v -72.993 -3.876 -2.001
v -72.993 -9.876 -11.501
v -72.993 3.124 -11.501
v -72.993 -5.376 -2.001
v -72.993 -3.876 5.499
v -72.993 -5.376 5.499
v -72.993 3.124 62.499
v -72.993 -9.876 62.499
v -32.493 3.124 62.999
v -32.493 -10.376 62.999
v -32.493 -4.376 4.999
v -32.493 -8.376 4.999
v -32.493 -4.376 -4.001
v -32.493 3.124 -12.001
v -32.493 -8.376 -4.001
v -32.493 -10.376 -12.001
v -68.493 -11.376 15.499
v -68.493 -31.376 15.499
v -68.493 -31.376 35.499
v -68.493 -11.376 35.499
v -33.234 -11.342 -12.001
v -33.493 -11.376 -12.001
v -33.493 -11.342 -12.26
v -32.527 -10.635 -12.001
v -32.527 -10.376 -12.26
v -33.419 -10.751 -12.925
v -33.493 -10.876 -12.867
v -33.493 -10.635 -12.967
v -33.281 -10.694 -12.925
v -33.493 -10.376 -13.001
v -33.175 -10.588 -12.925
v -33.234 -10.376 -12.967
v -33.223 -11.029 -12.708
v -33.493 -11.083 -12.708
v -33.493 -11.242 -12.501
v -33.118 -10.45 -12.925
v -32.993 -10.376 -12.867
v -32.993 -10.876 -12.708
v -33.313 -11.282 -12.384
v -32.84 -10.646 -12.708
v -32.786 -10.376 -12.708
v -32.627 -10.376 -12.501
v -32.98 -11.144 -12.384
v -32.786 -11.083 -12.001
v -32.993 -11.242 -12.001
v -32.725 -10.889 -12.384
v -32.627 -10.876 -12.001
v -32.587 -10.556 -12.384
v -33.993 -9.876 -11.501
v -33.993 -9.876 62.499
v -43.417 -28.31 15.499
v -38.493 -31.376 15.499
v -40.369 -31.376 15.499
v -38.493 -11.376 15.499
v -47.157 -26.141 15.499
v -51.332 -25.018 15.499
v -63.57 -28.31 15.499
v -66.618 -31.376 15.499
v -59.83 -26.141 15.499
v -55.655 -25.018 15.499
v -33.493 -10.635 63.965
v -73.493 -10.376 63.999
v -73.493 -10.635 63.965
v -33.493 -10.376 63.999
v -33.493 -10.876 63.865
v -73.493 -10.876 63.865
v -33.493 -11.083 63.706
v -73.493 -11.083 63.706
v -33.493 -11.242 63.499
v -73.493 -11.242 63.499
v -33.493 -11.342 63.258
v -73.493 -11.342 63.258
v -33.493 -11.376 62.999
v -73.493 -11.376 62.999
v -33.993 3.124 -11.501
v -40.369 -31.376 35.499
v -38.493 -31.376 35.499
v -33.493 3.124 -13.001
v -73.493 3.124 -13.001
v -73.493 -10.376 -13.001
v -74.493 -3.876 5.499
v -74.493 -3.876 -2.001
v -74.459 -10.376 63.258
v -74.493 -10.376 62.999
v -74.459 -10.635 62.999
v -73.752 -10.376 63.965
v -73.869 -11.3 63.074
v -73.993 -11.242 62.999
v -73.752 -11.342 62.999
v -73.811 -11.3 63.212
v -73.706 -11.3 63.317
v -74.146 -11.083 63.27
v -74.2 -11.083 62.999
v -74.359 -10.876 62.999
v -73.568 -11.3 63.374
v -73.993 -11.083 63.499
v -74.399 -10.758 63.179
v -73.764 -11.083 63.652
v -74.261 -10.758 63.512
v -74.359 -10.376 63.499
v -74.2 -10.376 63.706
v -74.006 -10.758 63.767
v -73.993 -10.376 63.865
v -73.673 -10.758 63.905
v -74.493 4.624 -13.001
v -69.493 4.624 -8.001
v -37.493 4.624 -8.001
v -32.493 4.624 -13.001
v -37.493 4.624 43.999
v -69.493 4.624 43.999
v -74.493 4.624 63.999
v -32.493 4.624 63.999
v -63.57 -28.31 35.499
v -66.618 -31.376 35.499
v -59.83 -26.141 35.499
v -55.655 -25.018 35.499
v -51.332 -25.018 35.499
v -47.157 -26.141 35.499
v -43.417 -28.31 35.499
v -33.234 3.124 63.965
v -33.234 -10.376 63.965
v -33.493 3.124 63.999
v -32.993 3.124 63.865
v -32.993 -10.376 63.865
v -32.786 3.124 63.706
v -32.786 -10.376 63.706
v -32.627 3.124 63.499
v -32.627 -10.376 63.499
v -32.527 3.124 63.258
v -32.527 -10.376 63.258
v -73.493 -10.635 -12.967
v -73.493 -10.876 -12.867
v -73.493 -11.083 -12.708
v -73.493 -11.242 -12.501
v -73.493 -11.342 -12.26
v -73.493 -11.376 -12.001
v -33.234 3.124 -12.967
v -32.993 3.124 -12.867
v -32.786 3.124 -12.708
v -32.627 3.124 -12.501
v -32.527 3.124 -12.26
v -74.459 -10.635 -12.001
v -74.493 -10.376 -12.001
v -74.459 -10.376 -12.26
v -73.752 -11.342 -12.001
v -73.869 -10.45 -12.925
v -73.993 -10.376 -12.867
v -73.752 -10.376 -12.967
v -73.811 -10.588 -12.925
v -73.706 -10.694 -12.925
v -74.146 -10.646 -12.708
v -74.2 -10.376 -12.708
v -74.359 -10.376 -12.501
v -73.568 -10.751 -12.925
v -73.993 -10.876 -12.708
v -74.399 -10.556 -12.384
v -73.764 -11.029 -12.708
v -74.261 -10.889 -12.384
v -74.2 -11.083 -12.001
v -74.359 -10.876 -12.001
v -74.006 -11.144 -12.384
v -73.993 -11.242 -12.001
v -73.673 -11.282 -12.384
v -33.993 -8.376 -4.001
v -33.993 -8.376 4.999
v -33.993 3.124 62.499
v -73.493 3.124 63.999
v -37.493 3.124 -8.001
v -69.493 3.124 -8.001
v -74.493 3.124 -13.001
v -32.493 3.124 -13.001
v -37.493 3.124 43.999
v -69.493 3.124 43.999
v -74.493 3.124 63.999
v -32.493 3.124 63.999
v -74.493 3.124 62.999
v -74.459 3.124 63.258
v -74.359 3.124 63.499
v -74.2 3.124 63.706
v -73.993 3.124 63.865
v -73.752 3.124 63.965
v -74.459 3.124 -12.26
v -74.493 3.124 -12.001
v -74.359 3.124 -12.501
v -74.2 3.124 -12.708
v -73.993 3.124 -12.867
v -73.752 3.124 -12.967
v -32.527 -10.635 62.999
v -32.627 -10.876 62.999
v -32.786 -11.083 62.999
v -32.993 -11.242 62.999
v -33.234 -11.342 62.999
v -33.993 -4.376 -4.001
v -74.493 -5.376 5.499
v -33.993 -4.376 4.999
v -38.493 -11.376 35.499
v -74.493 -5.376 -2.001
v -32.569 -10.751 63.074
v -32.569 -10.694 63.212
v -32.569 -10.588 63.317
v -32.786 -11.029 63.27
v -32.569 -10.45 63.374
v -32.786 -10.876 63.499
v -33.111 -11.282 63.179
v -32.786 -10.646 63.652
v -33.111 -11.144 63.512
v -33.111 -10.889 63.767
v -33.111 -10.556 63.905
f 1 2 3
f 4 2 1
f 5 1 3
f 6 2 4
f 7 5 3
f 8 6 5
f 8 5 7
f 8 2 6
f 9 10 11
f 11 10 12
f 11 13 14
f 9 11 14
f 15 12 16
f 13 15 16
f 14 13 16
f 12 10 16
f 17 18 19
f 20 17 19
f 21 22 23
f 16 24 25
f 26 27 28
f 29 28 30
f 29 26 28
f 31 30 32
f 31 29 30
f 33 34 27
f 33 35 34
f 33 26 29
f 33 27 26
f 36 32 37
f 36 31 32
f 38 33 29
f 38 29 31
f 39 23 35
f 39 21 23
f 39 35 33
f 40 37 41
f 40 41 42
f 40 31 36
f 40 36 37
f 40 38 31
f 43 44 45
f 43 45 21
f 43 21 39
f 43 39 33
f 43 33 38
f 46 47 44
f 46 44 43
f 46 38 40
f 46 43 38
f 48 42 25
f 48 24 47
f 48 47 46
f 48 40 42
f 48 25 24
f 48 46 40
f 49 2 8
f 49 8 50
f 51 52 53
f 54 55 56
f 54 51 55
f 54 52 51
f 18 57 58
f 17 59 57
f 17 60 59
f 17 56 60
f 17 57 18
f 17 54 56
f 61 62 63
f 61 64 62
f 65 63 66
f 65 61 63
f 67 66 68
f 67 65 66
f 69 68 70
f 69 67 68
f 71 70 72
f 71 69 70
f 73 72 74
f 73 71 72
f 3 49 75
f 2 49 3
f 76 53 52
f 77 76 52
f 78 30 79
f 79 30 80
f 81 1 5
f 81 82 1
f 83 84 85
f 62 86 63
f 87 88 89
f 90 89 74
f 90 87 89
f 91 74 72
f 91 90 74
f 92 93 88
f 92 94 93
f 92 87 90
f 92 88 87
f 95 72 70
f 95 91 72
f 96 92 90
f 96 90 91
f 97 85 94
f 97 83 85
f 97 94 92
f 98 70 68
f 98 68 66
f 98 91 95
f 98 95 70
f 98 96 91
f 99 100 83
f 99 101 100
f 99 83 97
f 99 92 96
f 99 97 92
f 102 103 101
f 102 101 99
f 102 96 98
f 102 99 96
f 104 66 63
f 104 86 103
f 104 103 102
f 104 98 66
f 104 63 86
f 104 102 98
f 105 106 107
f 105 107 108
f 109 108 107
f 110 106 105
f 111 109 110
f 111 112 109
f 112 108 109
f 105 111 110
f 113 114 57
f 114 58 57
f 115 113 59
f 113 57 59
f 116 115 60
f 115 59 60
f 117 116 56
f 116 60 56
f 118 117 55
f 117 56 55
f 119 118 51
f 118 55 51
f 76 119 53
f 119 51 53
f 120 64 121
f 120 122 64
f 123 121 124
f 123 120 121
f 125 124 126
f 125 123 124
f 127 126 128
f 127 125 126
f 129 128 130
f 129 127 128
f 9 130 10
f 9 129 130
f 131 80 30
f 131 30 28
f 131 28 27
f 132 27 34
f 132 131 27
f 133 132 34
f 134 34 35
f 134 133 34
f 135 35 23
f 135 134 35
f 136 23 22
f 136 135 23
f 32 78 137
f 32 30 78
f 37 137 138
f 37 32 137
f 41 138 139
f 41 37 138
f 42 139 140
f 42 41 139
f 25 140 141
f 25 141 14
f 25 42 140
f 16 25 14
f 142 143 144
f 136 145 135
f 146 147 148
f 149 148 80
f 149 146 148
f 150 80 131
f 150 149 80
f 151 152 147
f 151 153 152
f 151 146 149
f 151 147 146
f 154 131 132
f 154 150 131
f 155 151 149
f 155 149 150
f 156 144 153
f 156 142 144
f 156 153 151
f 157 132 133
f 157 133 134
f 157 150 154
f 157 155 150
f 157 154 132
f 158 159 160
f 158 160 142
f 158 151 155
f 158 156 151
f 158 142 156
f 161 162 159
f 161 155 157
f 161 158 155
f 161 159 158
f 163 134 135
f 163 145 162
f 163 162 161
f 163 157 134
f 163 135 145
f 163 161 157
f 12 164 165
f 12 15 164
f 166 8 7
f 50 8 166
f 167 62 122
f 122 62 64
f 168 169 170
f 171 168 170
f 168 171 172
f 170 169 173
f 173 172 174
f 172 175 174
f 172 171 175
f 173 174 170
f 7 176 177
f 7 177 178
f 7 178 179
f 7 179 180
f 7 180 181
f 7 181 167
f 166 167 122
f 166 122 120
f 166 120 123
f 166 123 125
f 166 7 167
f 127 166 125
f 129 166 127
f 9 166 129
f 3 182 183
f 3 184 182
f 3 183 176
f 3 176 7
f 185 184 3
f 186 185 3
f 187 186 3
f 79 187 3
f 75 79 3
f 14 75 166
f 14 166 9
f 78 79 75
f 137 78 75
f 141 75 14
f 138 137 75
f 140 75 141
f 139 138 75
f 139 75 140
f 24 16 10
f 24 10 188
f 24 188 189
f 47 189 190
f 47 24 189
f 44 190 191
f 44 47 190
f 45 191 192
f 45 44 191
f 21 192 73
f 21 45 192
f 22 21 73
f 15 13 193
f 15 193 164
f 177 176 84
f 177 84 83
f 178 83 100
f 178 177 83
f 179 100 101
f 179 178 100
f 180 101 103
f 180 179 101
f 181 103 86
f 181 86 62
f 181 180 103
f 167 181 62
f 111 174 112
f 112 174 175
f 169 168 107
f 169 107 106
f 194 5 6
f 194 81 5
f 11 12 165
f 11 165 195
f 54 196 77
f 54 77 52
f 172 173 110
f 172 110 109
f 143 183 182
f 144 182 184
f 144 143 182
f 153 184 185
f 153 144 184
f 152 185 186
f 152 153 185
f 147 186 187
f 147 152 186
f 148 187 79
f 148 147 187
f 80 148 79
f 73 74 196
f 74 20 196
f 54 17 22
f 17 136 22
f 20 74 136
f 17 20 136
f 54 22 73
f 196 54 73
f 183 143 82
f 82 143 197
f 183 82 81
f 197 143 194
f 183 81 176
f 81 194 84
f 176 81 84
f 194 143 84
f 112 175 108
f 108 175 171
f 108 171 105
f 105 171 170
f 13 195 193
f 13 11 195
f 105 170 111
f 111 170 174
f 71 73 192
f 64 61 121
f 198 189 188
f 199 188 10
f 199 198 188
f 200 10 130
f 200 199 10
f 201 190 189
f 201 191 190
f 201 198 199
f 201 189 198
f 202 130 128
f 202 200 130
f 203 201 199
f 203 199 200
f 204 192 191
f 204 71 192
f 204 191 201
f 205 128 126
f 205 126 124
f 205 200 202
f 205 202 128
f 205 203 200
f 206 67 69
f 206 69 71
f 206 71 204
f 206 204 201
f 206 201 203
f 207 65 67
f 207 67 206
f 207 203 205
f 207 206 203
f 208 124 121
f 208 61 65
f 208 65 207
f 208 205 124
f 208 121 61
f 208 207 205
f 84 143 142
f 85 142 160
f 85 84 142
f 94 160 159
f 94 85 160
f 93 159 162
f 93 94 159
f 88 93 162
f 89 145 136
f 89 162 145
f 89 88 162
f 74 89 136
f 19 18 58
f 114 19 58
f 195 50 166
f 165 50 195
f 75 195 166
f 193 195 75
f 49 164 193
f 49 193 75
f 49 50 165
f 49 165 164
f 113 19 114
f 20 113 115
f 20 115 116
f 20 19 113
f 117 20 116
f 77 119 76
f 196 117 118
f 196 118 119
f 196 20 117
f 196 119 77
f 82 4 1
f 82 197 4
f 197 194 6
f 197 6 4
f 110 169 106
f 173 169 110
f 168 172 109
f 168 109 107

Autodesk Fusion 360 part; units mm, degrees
sketch "草图1" plane through (0, 0, 0) normal (0, 1, 0) x (1, 0, 0)
  line L0 (0, 0) -> (42, 0)
  line L1 (42, 0) -> (42, 77)
  line L2 (42, 77) -> (0, 77)
  line L3 (0, 77) -> (0, 0)
  line L4 (1.5, 1.5) -> (40.5, 1.5)
  line L5 (40.5, 1.5) -> (40.5, 75.5)
  line L6 (40.5, 75.5) -> (1.5, 75.5)
  line L7 (1.5, 75.5) -> (1.5, 1.5)
  line L8 (6, 28.5) -> (36, 28.5)
  line L9 (36, 28.5) -> (36, 48.5)
  line L10 (36, 48.5) -> (6, 48.5)
  line L11 (6, 48.5) -> (6, 28.5)
  dimension "d1" = 42
  dimension "d2" = 77
  dimension "d3" = -1.5
  dimension "d12" = 30
  dimension "d13" = 20
  dimension "d14" = 6
  dimension "d15" = 28.5
extrude "拉伸1" add sketch "草图1" along normal blind 1.5 contours L0 L1 L2 L3 | L4 L5 L6 L7 | L8 L9 L10 L11 makes body 1
extrude "拉伸2" add sketch "草图1" along normal blind 14.5 contours L0 L1 L2 L3 bodies 1
sketch "草图2" plane through (0, 14.5, 0) normal (0, 1, 0) x (-1, 0, 0)
  line L0 (-1.5, -1.5) -> (-1.5, -75.5)
  line L1 (-1.5, -75.5) -> (-40.5, -75.5)
  line L2 (-40.5, -75.5) -> (-40.5, -1.5)
  line L3 (-40.5, -1.5) -> (-1.5, -1.5)
  line L4 (0, -77) -> (0, 0)
  line L5 (0, 0) -> (-42, 0)
  line L6 (-42, 0) -> (-42, -77)
  line L7 (-42, -77) -> (0, -77)
  line L8 (0, 0) -> (-42, 0)
  line L9 (-42, 0) -> (-42, -77)
  line L10 (-42, -77) -> (0, -77)
  line L11 (0, -77) -> (0, 0)
  line L12 (-37, -20) -> (-37, -72)
  line L13 (-37, -72) -> (-5, -72)
  line L14 (-5, -72) -> (-5, -20)
  line L15 (-5, -20) -> (-37, -20)
extrude "拉伸3" add sketch "草图2" along normal blind 1.5 separate body contours L0 L1 L2 L3 | L4 L5 L6 L7 L8 L9 L10 L11 makes body 2
copy_body "实体->零部件1" bodies 2 removing the originals makes body 3 in component "Component'"
extrude "拉伸4" add sketch "草图1" against normal blind 30 contours L8 L9 L10 L11 bodies 1
sketch "草图3" plane through (0, 0, -48.5) normal (0, 0, -1) x (-1, 0, 0)
  line L0 (-6, 0) -> (-36, 0)
  line L1 (-36, 0) -> (-36, -30)
  line L2 (-36, -30) -> (-6, -30)
  line L3 (-6, -30) -> (-6, 0)
  circle A0 centre (-21, -30) radius 16.5
  line L4 (-6, -20) -> (-36, -20)
  line L5 (-42, 0) -> (0, 0)
  dimension "d18" = 33
  dimension "d19" = 20
extrude "拉伸5" cut sketch "草图3" against normal blind 40 contours L3 A0 L4 | L1 A0 L4 | L1 L2 L3 A0 L4 | A0 L4 bodies 1
sketch "草图4" plane through (42, 0, 0) normal (1, 0, 0) x (0, 0, -1)
  line L0 (0, 0) -> (77, 0)
  line L1 (77, 0) -> (77, 14.5)
  line L2 (77, 14.5) -> (0, 14.5)
  line L3 (0, 14.5) -> (0, 0)
  line L4 (68, 3) -> (59, 3)
  line L5 (59, 3) -> (59, 7)
  line L6 (59, 7) -> (68, 7)
  line L7 (68, 7) -> (68, 3)
  line L8 (0, 0) -> (77, 0)
  dimension "d22" = 9
  dimension "d23" = 4
  dimension "d24" = 3
  dimension "d25" = 9
extrude "拉伸6" cut sketch "草图4" against normal blind 10 contours L4 L5 L6 L7 bodies 1
sketch "草图5" plane through (0, 0, 0) normal (-1, 0, 0) x (0, 0, 1)
  line L0 (-77, 0) -> (0, 0)
  line L1 (0, 0) -> (0, 14.5)
  line L2 (0, 14.5) -> (-77, 14.5)
  line L3 (-77, 14.5) -> (-77, 0)
  line L4 (-58.5, 6) -> (-66, 6)
  line L5 (-66, 6) -> (-66, 7.5)
  line L6 (-66, 7.5) -> (-58.5, 7.5)
  line L7 (-58.5, 7.5) -> (-58.5, 6)
  line L8 (-77, 0) -> (0, 0)
  dimension "d28" = 7.5
  dimension "d29" = 1.5
  dimension "d30" = 11
  dimension "d31" = 6
extrude "拉伸7" cut sketch "草图5" against normal blind 4 contours L4 L5 L6 L7 bodies 1
fillet "圆角1" radius 1 8 edges at (0, 7.25, 0) (0, 0, -38.5) (21, 0, 0) (42, 7.25, 0) (42, 0, -38.5) (42, 7.25, -77) (21, 0, -77) (0, 7.25, -77) on bodies 1
copy_body "实体->零部件2" bodies 1 removing the originals makes body 4 in component "Component''"
component "Component'" placed x (1, 0, 0) y (0, 1, 0) z (0, 0, 1) at (-74.4932, -11.3757, 63.999)
component "Component''" placed x (1, 0, 0) y (0, 1, 0) z (0, 0, 1) at (-74.4932, -11.3757, 63.999)
